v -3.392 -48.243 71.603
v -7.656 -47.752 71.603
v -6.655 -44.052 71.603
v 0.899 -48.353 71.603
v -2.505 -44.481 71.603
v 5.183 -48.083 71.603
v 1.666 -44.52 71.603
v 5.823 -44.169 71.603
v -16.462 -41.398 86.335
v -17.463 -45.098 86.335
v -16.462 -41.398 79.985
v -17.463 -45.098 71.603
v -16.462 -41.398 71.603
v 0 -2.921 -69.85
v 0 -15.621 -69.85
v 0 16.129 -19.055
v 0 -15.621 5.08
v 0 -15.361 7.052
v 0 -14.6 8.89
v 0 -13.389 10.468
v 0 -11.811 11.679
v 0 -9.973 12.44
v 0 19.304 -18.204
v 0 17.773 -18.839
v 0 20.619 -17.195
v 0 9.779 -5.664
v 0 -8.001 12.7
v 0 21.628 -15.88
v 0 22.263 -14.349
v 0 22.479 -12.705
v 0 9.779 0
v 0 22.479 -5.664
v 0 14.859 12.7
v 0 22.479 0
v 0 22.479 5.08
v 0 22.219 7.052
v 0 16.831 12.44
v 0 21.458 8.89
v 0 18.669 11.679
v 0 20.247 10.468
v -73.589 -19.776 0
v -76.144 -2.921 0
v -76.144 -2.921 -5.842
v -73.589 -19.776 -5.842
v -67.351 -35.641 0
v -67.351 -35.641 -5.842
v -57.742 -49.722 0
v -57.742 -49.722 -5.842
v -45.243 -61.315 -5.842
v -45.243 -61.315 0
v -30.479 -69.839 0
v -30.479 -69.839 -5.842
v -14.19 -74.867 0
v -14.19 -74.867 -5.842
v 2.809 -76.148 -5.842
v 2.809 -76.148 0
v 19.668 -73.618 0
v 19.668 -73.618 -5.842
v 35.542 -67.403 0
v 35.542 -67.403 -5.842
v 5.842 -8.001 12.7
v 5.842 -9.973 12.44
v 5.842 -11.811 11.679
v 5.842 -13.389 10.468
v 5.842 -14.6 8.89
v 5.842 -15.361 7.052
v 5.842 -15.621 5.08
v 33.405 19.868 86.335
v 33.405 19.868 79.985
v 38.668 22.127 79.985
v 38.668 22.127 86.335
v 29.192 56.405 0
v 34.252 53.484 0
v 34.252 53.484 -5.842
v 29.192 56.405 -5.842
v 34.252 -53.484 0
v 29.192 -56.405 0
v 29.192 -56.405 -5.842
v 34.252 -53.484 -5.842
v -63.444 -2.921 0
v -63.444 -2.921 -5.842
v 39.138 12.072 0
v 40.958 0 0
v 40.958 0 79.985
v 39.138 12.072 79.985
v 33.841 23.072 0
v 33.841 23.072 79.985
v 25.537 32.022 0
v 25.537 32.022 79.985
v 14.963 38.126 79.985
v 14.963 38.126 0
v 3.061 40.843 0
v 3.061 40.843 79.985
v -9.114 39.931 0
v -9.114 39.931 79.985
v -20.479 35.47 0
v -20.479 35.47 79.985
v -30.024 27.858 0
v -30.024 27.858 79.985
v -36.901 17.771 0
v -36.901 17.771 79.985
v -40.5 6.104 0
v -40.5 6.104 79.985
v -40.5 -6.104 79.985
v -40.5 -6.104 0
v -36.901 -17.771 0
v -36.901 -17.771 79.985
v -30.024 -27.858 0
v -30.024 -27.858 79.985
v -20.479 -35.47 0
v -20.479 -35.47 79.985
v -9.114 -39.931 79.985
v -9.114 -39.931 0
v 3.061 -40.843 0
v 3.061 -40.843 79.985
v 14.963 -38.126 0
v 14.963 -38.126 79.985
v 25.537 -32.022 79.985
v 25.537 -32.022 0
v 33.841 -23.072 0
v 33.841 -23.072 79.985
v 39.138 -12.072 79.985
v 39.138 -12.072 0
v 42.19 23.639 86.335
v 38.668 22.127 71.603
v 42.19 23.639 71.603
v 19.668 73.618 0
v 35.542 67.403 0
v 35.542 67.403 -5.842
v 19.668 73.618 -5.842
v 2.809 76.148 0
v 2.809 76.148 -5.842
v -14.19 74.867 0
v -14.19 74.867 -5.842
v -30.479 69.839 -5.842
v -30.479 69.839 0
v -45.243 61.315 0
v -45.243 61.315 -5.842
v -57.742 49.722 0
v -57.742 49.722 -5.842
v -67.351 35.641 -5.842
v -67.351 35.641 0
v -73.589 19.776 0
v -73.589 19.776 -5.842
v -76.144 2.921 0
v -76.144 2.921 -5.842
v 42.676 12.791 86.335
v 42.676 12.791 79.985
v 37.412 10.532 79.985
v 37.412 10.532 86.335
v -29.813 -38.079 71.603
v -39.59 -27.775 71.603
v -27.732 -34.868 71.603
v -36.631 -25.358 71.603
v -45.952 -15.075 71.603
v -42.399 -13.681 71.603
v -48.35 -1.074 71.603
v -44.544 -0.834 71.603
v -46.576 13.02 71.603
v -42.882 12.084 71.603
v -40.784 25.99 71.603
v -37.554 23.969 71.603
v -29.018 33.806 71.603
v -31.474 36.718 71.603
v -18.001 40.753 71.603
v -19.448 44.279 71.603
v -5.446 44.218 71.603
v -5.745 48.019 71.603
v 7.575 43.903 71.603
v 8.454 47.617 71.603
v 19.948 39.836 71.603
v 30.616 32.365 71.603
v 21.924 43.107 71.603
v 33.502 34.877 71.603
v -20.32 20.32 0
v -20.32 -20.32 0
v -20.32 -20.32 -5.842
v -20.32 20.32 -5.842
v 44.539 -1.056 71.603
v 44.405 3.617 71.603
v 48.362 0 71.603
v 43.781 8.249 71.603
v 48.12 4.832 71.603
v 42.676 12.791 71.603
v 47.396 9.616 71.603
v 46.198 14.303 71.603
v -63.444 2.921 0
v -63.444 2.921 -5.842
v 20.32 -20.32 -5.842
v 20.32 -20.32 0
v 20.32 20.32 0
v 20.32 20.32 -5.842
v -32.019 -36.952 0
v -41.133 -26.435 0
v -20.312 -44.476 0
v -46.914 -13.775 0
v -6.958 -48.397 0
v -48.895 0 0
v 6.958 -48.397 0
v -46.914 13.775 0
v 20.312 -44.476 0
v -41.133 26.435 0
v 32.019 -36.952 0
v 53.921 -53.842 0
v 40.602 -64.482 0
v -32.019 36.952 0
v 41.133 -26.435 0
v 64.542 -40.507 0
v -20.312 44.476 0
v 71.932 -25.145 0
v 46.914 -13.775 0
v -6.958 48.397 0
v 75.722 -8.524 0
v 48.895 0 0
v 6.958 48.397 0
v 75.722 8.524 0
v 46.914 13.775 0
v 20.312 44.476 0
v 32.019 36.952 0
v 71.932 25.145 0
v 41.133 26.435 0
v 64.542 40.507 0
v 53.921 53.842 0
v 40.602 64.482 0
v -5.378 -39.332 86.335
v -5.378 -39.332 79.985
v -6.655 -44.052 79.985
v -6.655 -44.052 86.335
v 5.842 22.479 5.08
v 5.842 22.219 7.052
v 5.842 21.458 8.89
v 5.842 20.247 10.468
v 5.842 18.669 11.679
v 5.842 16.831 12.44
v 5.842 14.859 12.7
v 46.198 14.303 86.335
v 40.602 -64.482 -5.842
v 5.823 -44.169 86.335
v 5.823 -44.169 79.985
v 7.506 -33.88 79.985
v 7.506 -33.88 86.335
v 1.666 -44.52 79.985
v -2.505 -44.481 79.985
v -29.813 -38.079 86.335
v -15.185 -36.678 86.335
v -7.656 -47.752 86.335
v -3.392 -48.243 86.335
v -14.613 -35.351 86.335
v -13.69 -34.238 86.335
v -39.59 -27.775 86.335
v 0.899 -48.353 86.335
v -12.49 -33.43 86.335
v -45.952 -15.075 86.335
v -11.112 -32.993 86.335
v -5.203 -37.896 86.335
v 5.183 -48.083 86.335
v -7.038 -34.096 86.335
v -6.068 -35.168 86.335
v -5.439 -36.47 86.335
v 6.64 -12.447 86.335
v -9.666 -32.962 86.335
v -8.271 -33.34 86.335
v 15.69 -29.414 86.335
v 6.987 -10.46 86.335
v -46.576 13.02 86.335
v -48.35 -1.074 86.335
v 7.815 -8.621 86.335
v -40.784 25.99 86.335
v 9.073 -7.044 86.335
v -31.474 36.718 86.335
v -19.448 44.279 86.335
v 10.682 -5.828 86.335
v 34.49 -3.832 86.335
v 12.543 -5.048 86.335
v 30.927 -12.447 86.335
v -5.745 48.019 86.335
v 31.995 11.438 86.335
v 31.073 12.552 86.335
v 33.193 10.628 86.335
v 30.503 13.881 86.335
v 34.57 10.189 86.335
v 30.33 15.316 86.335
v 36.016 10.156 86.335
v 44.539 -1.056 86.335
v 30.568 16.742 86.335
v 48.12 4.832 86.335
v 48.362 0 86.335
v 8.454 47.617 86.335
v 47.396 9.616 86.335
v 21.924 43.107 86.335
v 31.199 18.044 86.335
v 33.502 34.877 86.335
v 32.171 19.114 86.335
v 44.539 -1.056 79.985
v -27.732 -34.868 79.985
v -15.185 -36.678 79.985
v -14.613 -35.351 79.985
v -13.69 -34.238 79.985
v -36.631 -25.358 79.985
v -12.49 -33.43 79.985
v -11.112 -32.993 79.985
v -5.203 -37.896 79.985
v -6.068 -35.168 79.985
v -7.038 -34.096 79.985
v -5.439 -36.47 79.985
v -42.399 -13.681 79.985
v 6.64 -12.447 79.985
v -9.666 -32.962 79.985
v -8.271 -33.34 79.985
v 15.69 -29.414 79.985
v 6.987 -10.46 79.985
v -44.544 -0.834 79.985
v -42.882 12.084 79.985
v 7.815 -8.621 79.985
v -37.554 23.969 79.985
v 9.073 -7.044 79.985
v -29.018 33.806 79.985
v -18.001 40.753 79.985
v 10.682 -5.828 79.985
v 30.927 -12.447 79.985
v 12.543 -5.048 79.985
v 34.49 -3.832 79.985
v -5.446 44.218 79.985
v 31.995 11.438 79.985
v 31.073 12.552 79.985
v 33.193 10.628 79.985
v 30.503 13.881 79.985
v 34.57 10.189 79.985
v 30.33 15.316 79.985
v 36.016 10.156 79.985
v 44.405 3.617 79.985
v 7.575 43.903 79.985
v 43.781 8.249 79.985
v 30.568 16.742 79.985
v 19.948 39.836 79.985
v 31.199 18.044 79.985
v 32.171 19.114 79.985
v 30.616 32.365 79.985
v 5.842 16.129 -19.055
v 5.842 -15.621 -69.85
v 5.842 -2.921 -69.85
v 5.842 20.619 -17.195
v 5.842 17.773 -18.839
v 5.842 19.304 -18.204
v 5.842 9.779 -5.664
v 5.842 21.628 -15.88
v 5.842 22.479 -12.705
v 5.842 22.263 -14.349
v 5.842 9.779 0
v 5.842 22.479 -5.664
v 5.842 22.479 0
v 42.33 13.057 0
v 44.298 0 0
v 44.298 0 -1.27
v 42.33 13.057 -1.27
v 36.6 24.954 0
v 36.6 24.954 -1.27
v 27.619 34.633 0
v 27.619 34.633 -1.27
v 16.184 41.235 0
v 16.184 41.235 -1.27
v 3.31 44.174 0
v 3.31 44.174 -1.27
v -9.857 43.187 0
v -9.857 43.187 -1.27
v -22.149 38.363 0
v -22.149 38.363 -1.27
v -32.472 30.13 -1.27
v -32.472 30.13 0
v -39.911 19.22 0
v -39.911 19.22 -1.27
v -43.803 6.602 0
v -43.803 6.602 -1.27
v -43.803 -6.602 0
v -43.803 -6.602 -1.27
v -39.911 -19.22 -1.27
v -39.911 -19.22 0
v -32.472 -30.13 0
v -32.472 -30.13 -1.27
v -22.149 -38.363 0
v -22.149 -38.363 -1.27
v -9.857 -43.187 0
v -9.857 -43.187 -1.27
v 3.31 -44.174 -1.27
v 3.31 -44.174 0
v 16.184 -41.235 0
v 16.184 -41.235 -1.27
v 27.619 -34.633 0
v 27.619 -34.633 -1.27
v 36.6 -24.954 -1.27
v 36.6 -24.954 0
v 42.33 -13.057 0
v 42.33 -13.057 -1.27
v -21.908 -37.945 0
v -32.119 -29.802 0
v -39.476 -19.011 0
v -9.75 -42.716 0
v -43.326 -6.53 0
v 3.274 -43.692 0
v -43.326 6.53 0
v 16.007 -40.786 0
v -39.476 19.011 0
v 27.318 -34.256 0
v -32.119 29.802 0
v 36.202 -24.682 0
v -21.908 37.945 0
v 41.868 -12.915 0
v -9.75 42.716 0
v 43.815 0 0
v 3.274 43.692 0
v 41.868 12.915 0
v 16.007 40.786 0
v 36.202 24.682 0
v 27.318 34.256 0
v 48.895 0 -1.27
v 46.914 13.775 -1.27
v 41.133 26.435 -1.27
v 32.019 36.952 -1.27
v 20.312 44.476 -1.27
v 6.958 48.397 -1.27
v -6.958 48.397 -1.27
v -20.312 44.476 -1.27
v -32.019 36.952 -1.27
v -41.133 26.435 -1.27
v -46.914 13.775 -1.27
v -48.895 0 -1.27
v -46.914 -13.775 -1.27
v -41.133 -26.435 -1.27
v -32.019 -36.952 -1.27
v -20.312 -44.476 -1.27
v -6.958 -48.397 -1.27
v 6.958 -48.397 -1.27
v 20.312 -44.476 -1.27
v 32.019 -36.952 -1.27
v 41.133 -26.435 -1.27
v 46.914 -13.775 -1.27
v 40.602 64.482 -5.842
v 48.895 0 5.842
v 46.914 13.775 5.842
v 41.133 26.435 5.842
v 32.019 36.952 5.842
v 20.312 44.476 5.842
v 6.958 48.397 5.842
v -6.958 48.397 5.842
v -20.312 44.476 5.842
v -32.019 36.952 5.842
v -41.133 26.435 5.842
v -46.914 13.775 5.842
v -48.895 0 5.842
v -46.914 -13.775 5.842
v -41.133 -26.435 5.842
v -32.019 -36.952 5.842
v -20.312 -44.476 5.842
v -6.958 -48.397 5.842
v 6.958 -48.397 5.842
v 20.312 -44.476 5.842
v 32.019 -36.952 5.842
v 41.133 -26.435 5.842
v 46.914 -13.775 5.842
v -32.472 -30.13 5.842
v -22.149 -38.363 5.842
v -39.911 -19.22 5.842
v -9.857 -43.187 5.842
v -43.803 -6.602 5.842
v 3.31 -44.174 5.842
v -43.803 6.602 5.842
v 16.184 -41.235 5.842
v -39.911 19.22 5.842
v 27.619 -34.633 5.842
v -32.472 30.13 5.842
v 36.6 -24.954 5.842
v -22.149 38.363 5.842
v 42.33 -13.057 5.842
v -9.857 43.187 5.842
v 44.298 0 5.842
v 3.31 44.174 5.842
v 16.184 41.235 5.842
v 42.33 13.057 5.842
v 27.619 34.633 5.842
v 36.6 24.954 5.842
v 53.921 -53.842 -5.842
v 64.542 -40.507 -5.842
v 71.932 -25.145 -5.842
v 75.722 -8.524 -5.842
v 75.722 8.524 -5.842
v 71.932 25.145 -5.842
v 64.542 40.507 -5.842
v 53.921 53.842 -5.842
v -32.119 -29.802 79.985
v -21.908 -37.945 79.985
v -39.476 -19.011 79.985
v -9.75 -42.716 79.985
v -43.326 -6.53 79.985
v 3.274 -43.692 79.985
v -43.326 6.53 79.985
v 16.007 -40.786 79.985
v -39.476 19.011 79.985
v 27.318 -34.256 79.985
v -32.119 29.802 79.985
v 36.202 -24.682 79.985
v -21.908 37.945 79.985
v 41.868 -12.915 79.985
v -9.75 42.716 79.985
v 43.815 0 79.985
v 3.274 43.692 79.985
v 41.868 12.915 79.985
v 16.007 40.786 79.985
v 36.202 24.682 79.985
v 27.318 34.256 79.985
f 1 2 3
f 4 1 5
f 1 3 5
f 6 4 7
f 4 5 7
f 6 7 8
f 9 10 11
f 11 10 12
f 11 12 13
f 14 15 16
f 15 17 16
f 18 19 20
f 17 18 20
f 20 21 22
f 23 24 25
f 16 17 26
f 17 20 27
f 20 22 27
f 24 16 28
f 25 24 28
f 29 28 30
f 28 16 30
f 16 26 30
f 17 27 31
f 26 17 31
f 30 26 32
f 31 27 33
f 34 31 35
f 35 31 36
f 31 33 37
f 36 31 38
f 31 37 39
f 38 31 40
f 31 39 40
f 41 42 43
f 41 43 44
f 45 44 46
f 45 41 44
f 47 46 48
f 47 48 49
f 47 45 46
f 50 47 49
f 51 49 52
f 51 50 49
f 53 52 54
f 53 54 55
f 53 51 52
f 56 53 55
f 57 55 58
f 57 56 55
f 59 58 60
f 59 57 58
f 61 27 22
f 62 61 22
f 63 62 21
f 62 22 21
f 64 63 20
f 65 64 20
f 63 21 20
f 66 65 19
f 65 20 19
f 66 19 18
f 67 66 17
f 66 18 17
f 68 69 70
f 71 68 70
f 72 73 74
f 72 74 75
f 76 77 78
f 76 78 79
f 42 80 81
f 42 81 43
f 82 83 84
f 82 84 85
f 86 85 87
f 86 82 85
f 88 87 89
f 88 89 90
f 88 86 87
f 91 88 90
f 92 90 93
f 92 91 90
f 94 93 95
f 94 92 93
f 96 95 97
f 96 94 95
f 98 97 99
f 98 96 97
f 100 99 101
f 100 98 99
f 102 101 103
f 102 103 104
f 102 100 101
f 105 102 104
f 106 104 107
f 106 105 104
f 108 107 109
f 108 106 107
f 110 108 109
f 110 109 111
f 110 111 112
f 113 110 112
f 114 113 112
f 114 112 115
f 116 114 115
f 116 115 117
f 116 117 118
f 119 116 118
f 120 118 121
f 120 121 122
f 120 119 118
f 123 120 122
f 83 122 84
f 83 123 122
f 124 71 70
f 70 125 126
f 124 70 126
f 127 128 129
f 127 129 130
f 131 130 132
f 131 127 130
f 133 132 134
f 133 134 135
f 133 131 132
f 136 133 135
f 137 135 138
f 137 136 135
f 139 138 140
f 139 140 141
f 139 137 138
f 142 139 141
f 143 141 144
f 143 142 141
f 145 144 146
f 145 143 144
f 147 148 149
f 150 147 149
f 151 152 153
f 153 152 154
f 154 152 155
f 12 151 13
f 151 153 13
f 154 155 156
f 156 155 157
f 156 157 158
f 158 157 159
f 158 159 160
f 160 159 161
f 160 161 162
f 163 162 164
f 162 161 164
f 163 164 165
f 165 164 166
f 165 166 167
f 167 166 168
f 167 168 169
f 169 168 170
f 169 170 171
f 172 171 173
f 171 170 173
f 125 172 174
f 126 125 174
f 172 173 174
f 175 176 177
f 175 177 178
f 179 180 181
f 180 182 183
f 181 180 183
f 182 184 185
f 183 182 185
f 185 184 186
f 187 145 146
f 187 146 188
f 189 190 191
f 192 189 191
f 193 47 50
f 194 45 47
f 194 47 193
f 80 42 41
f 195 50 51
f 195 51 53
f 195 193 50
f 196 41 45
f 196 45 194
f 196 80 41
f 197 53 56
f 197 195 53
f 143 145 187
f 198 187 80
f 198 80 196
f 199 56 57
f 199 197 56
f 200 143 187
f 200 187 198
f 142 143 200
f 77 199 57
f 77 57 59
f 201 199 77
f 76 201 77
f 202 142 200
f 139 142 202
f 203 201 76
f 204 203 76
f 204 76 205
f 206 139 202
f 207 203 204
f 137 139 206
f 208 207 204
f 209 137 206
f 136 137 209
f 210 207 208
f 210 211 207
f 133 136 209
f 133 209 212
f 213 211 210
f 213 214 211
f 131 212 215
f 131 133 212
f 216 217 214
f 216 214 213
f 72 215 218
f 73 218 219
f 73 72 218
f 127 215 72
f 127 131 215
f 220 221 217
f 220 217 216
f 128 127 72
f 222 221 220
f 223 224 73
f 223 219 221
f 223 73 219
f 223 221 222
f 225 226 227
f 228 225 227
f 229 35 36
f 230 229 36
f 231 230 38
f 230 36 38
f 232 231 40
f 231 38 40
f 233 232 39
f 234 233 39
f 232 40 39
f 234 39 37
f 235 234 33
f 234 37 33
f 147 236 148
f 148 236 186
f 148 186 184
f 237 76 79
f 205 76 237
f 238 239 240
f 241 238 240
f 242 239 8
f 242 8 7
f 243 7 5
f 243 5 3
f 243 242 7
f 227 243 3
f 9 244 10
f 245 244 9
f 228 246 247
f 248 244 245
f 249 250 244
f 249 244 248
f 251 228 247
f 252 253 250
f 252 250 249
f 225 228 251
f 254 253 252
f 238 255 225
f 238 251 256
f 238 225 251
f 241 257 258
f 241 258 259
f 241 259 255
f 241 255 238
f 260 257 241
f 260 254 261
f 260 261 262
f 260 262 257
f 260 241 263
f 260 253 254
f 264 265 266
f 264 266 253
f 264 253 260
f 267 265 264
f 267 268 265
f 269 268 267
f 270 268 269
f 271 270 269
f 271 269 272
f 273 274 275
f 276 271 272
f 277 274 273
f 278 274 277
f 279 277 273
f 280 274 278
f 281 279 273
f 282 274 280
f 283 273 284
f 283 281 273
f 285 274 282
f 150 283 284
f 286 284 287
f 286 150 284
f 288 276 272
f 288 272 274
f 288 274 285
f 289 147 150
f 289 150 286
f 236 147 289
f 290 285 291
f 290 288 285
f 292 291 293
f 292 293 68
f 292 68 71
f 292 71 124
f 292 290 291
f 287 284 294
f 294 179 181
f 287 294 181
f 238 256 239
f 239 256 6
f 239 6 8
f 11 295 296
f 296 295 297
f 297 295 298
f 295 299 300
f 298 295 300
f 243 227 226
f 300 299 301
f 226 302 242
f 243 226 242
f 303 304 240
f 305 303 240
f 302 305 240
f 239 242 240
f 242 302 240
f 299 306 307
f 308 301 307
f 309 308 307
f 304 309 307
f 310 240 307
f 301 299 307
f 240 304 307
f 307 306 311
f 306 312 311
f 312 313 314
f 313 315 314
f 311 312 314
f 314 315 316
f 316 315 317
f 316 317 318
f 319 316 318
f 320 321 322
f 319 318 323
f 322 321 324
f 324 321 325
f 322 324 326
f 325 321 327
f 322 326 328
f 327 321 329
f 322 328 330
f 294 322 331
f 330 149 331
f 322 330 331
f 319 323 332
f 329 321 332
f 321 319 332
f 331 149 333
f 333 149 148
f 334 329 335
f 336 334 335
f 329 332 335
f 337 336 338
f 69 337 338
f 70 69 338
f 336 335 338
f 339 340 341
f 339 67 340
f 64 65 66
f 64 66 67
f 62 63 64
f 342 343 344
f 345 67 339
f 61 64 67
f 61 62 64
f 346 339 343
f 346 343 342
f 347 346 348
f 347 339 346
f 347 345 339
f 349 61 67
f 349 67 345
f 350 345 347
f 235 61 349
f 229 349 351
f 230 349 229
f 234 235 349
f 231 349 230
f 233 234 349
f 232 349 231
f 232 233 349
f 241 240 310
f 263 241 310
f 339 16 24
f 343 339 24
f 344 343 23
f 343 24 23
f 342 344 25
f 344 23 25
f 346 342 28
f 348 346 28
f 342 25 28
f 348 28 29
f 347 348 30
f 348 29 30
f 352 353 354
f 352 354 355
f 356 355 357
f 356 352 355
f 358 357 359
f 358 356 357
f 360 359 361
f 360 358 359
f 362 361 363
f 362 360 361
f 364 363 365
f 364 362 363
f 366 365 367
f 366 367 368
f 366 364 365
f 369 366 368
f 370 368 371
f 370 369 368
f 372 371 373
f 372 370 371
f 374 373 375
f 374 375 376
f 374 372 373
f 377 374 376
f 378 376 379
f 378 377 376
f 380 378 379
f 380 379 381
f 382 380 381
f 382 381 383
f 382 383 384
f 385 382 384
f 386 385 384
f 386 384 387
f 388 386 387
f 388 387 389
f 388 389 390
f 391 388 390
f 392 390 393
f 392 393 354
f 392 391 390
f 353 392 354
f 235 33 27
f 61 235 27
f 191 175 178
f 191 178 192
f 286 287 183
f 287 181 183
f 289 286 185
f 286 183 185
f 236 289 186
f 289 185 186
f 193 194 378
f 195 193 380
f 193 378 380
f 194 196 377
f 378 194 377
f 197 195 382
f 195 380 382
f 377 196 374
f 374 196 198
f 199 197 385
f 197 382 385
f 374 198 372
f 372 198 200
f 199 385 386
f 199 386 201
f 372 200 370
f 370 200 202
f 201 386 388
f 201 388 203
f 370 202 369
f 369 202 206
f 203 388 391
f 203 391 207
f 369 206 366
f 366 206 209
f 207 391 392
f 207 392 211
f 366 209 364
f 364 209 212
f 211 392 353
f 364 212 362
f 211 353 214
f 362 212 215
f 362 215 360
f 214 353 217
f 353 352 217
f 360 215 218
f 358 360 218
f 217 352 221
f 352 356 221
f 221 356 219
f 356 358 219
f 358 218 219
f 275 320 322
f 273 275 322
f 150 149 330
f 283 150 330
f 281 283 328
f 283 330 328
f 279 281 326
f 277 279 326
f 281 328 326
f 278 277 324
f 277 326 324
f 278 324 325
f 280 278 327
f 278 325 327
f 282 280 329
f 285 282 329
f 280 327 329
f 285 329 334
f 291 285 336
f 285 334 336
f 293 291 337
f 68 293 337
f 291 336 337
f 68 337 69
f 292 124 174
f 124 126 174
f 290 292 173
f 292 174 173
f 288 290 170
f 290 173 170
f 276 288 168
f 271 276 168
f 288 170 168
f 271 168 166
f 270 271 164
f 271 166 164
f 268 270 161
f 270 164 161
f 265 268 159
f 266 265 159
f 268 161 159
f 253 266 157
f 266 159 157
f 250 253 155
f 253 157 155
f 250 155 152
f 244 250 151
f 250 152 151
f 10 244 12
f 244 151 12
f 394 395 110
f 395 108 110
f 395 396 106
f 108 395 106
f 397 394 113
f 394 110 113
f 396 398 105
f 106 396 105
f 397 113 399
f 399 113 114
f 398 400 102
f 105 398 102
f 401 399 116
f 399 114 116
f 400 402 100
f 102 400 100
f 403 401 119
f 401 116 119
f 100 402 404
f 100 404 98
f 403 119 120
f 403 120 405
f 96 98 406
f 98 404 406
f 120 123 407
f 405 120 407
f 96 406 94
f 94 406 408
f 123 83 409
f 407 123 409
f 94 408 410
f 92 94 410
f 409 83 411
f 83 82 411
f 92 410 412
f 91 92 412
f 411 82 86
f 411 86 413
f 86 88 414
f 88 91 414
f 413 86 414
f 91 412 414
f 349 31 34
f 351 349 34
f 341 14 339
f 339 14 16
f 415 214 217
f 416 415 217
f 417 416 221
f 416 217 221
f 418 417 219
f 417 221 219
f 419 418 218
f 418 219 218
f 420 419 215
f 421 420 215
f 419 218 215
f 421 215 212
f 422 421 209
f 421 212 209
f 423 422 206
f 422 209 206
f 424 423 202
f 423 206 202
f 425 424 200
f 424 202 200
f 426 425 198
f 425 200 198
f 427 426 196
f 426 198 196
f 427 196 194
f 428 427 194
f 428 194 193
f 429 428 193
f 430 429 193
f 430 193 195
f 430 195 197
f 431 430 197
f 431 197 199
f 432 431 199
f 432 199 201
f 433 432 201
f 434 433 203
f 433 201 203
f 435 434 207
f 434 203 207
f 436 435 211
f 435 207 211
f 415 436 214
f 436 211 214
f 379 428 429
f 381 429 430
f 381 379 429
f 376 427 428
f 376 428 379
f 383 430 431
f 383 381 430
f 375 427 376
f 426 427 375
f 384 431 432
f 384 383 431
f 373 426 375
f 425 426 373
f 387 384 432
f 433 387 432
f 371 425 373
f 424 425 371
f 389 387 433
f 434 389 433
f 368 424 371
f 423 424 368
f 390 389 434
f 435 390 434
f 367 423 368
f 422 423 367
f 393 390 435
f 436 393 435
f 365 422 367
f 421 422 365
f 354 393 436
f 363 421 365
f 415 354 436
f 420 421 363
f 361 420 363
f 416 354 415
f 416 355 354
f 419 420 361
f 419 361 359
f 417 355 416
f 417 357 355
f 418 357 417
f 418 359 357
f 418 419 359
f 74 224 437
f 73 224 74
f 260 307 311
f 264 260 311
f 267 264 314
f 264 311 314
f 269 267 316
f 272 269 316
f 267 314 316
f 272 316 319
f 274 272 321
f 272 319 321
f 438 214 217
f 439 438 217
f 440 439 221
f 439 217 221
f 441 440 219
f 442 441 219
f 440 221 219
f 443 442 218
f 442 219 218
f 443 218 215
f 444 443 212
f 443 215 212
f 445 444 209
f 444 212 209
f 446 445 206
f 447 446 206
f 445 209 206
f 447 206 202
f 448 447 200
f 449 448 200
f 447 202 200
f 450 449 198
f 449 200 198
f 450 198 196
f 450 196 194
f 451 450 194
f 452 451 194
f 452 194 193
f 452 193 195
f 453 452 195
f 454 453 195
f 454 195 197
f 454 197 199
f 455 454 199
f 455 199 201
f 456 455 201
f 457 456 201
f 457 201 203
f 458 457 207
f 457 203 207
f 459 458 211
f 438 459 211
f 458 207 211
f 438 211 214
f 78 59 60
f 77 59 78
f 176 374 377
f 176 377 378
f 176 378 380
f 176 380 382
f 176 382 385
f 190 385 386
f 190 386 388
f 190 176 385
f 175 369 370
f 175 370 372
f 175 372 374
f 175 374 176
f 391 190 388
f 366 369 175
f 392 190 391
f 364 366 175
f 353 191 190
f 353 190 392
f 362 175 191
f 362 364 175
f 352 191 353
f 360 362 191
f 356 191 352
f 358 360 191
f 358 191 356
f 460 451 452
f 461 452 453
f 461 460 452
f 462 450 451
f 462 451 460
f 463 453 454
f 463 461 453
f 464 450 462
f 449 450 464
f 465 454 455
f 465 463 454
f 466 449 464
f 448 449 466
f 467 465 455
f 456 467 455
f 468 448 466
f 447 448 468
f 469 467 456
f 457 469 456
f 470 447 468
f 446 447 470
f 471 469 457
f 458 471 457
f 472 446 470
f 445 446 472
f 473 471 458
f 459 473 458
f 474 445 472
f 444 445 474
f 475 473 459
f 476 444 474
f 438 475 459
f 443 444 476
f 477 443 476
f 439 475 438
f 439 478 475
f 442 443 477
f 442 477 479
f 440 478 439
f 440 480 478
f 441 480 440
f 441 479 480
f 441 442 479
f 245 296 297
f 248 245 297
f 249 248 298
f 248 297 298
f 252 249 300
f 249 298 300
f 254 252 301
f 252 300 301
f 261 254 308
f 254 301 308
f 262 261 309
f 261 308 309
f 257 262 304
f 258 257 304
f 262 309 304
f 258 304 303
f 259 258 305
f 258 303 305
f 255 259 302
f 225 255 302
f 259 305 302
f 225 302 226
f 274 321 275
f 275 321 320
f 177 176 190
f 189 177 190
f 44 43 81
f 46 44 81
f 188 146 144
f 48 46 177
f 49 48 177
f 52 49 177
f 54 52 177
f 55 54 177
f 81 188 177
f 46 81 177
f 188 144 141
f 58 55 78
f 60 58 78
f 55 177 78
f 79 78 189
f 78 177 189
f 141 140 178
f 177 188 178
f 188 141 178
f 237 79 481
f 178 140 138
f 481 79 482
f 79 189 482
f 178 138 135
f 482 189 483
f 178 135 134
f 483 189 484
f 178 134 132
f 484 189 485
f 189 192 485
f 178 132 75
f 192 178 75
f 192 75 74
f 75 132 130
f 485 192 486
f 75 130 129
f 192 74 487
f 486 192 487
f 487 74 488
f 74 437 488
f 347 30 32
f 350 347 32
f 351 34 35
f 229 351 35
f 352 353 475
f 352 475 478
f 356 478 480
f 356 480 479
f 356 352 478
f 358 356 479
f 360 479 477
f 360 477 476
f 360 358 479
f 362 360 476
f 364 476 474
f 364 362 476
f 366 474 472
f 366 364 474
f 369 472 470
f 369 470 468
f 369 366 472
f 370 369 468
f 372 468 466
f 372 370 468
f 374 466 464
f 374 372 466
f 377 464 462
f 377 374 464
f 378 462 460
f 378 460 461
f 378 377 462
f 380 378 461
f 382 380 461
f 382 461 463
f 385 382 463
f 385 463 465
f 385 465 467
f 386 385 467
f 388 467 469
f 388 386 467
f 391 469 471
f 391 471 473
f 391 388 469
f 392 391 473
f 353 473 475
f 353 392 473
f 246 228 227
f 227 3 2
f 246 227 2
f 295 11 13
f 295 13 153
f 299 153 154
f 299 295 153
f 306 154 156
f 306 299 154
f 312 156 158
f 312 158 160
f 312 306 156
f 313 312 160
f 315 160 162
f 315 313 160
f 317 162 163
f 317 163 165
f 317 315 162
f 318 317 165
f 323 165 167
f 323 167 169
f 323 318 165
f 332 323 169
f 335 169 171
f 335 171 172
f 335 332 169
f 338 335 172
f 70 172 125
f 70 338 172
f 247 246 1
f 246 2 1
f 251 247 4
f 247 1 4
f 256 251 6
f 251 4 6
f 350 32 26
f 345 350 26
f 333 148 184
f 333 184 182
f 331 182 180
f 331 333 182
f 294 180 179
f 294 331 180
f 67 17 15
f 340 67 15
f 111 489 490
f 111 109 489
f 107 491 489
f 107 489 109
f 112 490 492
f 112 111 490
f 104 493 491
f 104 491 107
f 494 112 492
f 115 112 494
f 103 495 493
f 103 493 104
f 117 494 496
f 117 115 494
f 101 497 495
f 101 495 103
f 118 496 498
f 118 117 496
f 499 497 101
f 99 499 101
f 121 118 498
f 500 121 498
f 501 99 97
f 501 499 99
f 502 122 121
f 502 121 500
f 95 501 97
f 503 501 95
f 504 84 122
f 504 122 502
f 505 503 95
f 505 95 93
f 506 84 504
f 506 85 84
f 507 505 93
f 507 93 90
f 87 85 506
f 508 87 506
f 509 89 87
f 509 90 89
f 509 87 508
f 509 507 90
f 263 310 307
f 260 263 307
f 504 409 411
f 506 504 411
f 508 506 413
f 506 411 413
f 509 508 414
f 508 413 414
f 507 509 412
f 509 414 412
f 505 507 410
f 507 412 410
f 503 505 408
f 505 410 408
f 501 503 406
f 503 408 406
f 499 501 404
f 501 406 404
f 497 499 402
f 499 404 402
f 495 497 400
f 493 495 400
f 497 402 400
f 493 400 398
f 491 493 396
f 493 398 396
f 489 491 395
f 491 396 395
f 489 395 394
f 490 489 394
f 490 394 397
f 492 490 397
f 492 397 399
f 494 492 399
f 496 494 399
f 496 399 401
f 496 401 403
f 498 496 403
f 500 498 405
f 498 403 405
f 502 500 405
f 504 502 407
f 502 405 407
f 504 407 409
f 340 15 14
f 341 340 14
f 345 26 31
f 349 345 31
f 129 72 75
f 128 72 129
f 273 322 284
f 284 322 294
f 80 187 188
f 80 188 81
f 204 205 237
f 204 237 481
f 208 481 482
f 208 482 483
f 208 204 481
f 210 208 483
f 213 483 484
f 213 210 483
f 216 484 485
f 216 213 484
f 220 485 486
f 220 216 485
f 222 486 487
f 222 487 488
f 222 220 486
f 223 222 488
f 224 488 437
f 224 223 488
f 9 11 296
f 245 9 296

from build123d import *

# Parameters (mm, degrees)
F0_R      = 43.815
F0_R_2    = 40.9575
F1_DEPTH  = 79.9846
F2_W      = 40.64
F2_H      = 40.64
F3_DEPTH  = 5.842
F4_DEPTH  = 5.843
F6_DEPTH  = 5.842
F8_DEPTH  = 8.382
F9_DEPTH  = 6.35
F0_R_3    = 48.895
F0_R_4    = 44.2976
F10_DEPTH = 5.842
F11_DEPTH = 1.27


# Not quite as in the source:
# - a feature names something its author has since deleted; it is built from what else it names


with BuildPart() as f1:
    # F0 (on Top) → F1 (new body)
    with BuildSketch(Plane.XY):
        Circle(F0_R)
        Circle(F0_R_2, mode=Mode.SUBTRACT)
    extrude(amount=F1_DEPTH)

    # F2 (on Top) → F4 (cut, through all)
    with BuildSketch(Plane.XY):
        Rectangle(F2_W, F2_H)
    extrude(amount=-F4_DEPTH, mode=Mode.SUBTRACT)


with BuildPart() as f3:
    # F2 (on Top) → F3 (new body)
    with BuildSketch(Plane.XY):
        with BuildLine():
            Line((-63.4439935845, -2.921), (-76.1439935845, -2.921))
            ThreePointArc((-76.1439935845, -2.921), (-38.1, -65.9911357684), (35.5423365878, -67.4031327898))
            Line((35.5423365878, -67.4031327898), (29.1923365878, -56.4046101617))
            Line((29.1923365878, -56.4046101617), (34.2516569967, -53.4836101617))
            Line((34.2516569967, -53.4836101617), (40.6016569967, -64.4821327898))
            ThreePointArc((40.6016569967, -64.4821327898), (76.2, 0), (40.6016569967, 64.4821327898))
            Line((40.6016569967, 64.4821327898), (34.2516569967, 53.4836101617))
            Line((34.2516569967, 53.4836101617), (29.1923365878, 56.4046101617))
            Line((29.1923365878, 56.4046101617), (35.5423365878, 67.4031327898))
            ThreePointArc((35.5423365878, 67.4031327898), (-38.1, 65.9911357684), (-76.1439935845, 2.921))
            Line((-76.1439935845, 2.921), (-63.4439935845, 2.921))
            Line((-63.4439935845, 2.921), (-63.4439935845, -2.921))
        make_face()
        Rectangle(F2_W, F2_H, mode=Mode.SUBTRACT)
    extrude(amount=-F3_DEPTH)

    # F0 (on Top) → F11 (cut)
    with BuildSketch(Plane.XY):
        Circle(F0_R_3)
        Circle(F0_R_4, mode=Mode.SUBTRACT)
    extrude(amount=-F11_DEPTH, mode=Mode.SUBTRACT)


with BuildPart() as f6:
    # F5 (on Right) → F6 (new body)
    with BuildSketch(Plane.YZ):
        with BuildLine():
            Line((-15.621, -69.85), (-2.921, -69.85))
            Line((-2.921, -69.85), (16.1294304292, -19.0553526104))
            ThreePointArc((16.1294304292, -19.0553526104), (20.6192802377, -17.1953285033), (22.479, -12.705352625))
            Line((22.479, -12.705352625), (22.479, -5.6642))
            Line((22.479, -5.6642), (9.779, -5.6642))
            Line((9.779, -5.6642), (9.779, 0))
            Line((9.779, 0), (22.479, 0))
            Line((22.479, 0), (22.479, 5.08))
            ThreePointArc((22.479, 5.08), (20.2471536726, 10.4681536726), (14.859, 12.7))
            Line((14.859, 12.7), (-8.001, 12.7))
            ThreePointArc((-8.001, 12.7), (-13.3891536726, 10.4681536726), (-15.621, 5.08))
            Line((-15.621, 5.08), (-15.621, -69.85))
        make_face()
    extrude(amount=F6_DEPTH)


with BuildPart() as f8:
    # F7 (on face) → F8 (new body)
    with BuildSketch(Plane.XY.offset(79.9846)):
        with BuildLine():
            ThreePointArc((42.675855879, 12.7912621565), (44.1536785796, 5.9411893128), (44.5390860822, -1.0558757115))
            Line((44.5390860822, -1.0558757115), (48.3616, 0))
            ThreePointArc((48.3616, 0), (47.8176579237, 7.2329762373), (46.198067559, 14.3032481757))
            Line((46.198067559, 14.3032481757), (42.675855879, 12.7912621565))
        make_face()
    extrude(amount=-F8_DEPTH)



with BuildPart() as f8b:
    # F7 (on face) → F8, piece 2 (new body)
    with BuildSketch(Plane.XY.offset(79.9846)):
        with BuildLine():
            Line((5.1829115282, -48.0830716849), (5.8230474227, -44.1694145453))
            ThreePointArc((5.8230474227, -44.1694145453), (-0.4201112399, -44.5496191803), (-6.6549894488, -44.0517443241))
            Line((-6.6549894488, -44.0517443241), (-7.6559784913, -47.7517575373))
            ThreePointArc((-7.6559784913, -47.7517575373), (-1.2475805854, -48.3455054503), (5.1829115282, -48.0830716849))
        make_face()
    extrude(amount=-F8_DEPTH)


with BuildPart() as f8c:
    # F7 (on face) → F8, piece 3 (new body)
    with BuildSketch(Plane.XY.offset(79.9846)):
        with BuildLine():
            ThreePointArc((-16.4624232954, -41.3984743898), (-33.6475489603, 29.2008135422), (38.6681126614, 22.127406666))
            Line((38.6681126614, 22.127406666), (42.1903243414, 23.6393926852))
            ThreePointArc((42.1903243414, 23.6393926852), (-36.525047446, 31.6980324882), (-17.4634123379, -45.098487603))
            Line((-17.4634123379, -45.098487603), (-16.4624232954, -41.3984743898))
        make_face()
    extrude(amount=-F8_DEPTH)


with BuildPart() as f8_1:
    add(f8.part)

    add(f8b.part)  # F9 merges F8b

    add(f8c.part)  # F9 merges F8c
    # F7 (on face) → F9 (join)
    with BuildSketch(Plane.XY.offset(79.9846)):
        with BuildLine():
            Line((34.489602072, -3.8317991766), (44.5390860822, -1.0558757115))
            ThreePointArc((44.5390860822, -1.0558757115), (44.1536785796, 5.9411893128), (42.675855879, 12.7912621565))
            Line((42.675855879, 12.7912621565), (37.4123476678, 10.5317867047))
            ThreePointArc((37.4123476678, 10.5317867047), (30.7404038042, 13.1959873507), (33.4046044502, 19.8679312142))
            Line((33.4046044502, 19.8679312142), (38.6681126614, 22.127406666))
            ThreePointArc((38.6681126614, 22.127406666), (-33.6475489603, 29.2008135422), (-16.4624232954, -41.3984743898))
            Line((-16.4624232954, -41.3984743898), (-15.1854641746, -36.6783771467))
            ThreePointArc((-15.1854641746, -36.6783771467), (-8.9551122842, -33.1012951905), (-5.378030328, -39.331647081))
            Line((-5.378030328, -39.331647081), (-6.6549894488, -44.0517443241))
            ThreePointArc((-6.6549894488, -44.0517443241), (-0.4201112399, -44.5496191803), (5.8230474227, -44.1694145453))
            Line((5.8230474227, -44.1694145453), (7.5059805853, -33.8803127415))
            Line((7.5059805853, -33.8803127415), (15.690090875, -29.4144514582))
            Line((15.690090875, -29.4144514582), (6.6396118432, -12.4473810776))
            ThreePointArc((6.6396118432, -12.4473810776), (8.394602452, -7.7932588029), (12.5425105212, -5.0481349743))
            Line((12.5425105212, -5.0481349743), (30.9265518698, -12.4473810776))
            Line((30.9265518698, -12.4473810776), (34.489602072, -3.8317991766))
        make_face()
        with BuildLine():
            ThreePointArc((42.675855879, 12.7912621565), (44.1536785796, 5.9411893128), (44.5390860822, -1.0558757115))
            Line((44.5390860822, -1.0558757115), (48.3616, 0))
            ThreePointArc((48.3616, 0), (47.8176579237, 7.2329762373), (46.198067559, 14.3032481757))
            Line((46.198067559, 14.3032481757), (42.675855879, 12.7912621565))
        make_face()
        with BuildLine():
            ThreePointArc((-16.4624232954, -41.3984743898), (-33.6475489603, 29.2008135422), (38.6681126614, 22.127406666))
            Line((38.6681126614, 22.127406666), (42.1903243414, 23.6393926852))
            ThreePointArc((42.1903243414, 23.6393926852), (-36.525047446, 31.6980324882), (-17.4634123379, -45.098487603))
            Line((-17.4634123379, -45.098487603), (-16.4624232954, -41.3984743898))
        make_face()
        with BuildLine():
            Line((5.1829115282, -48.0830716849), (5.8230474227, -44.1694145453))
            ThreePointArc((5.8230474227, -44.1694145453), (-0.4201112399, -44.5496191803), (-6.6549894488, -44.0517443241))
            Line((-6.6549894488, -44.0517443241), (-7.6559784913, -47.7517575373))
            ThreePointArc((-7.6559784913, -47.7517575373), (-1.2475805854, -48.3455054503), (5.1829115282, -48.0830716849))
        make_face()
    extrude(amount=F9_DEPTH)


with BuildPart() as f10:
    # F0 (on Top) → F10 (new body)
    with BuildSketch(Plane.XY):
        Circle(F0_R_3)
        Circle(F0_R_4, mode=Mode.SUBTRACT)
    extrude(amount=F10_DEPTH)


solid = Compound([f1.part, f3.part, f6.part, f8_1.part, f10.part])
